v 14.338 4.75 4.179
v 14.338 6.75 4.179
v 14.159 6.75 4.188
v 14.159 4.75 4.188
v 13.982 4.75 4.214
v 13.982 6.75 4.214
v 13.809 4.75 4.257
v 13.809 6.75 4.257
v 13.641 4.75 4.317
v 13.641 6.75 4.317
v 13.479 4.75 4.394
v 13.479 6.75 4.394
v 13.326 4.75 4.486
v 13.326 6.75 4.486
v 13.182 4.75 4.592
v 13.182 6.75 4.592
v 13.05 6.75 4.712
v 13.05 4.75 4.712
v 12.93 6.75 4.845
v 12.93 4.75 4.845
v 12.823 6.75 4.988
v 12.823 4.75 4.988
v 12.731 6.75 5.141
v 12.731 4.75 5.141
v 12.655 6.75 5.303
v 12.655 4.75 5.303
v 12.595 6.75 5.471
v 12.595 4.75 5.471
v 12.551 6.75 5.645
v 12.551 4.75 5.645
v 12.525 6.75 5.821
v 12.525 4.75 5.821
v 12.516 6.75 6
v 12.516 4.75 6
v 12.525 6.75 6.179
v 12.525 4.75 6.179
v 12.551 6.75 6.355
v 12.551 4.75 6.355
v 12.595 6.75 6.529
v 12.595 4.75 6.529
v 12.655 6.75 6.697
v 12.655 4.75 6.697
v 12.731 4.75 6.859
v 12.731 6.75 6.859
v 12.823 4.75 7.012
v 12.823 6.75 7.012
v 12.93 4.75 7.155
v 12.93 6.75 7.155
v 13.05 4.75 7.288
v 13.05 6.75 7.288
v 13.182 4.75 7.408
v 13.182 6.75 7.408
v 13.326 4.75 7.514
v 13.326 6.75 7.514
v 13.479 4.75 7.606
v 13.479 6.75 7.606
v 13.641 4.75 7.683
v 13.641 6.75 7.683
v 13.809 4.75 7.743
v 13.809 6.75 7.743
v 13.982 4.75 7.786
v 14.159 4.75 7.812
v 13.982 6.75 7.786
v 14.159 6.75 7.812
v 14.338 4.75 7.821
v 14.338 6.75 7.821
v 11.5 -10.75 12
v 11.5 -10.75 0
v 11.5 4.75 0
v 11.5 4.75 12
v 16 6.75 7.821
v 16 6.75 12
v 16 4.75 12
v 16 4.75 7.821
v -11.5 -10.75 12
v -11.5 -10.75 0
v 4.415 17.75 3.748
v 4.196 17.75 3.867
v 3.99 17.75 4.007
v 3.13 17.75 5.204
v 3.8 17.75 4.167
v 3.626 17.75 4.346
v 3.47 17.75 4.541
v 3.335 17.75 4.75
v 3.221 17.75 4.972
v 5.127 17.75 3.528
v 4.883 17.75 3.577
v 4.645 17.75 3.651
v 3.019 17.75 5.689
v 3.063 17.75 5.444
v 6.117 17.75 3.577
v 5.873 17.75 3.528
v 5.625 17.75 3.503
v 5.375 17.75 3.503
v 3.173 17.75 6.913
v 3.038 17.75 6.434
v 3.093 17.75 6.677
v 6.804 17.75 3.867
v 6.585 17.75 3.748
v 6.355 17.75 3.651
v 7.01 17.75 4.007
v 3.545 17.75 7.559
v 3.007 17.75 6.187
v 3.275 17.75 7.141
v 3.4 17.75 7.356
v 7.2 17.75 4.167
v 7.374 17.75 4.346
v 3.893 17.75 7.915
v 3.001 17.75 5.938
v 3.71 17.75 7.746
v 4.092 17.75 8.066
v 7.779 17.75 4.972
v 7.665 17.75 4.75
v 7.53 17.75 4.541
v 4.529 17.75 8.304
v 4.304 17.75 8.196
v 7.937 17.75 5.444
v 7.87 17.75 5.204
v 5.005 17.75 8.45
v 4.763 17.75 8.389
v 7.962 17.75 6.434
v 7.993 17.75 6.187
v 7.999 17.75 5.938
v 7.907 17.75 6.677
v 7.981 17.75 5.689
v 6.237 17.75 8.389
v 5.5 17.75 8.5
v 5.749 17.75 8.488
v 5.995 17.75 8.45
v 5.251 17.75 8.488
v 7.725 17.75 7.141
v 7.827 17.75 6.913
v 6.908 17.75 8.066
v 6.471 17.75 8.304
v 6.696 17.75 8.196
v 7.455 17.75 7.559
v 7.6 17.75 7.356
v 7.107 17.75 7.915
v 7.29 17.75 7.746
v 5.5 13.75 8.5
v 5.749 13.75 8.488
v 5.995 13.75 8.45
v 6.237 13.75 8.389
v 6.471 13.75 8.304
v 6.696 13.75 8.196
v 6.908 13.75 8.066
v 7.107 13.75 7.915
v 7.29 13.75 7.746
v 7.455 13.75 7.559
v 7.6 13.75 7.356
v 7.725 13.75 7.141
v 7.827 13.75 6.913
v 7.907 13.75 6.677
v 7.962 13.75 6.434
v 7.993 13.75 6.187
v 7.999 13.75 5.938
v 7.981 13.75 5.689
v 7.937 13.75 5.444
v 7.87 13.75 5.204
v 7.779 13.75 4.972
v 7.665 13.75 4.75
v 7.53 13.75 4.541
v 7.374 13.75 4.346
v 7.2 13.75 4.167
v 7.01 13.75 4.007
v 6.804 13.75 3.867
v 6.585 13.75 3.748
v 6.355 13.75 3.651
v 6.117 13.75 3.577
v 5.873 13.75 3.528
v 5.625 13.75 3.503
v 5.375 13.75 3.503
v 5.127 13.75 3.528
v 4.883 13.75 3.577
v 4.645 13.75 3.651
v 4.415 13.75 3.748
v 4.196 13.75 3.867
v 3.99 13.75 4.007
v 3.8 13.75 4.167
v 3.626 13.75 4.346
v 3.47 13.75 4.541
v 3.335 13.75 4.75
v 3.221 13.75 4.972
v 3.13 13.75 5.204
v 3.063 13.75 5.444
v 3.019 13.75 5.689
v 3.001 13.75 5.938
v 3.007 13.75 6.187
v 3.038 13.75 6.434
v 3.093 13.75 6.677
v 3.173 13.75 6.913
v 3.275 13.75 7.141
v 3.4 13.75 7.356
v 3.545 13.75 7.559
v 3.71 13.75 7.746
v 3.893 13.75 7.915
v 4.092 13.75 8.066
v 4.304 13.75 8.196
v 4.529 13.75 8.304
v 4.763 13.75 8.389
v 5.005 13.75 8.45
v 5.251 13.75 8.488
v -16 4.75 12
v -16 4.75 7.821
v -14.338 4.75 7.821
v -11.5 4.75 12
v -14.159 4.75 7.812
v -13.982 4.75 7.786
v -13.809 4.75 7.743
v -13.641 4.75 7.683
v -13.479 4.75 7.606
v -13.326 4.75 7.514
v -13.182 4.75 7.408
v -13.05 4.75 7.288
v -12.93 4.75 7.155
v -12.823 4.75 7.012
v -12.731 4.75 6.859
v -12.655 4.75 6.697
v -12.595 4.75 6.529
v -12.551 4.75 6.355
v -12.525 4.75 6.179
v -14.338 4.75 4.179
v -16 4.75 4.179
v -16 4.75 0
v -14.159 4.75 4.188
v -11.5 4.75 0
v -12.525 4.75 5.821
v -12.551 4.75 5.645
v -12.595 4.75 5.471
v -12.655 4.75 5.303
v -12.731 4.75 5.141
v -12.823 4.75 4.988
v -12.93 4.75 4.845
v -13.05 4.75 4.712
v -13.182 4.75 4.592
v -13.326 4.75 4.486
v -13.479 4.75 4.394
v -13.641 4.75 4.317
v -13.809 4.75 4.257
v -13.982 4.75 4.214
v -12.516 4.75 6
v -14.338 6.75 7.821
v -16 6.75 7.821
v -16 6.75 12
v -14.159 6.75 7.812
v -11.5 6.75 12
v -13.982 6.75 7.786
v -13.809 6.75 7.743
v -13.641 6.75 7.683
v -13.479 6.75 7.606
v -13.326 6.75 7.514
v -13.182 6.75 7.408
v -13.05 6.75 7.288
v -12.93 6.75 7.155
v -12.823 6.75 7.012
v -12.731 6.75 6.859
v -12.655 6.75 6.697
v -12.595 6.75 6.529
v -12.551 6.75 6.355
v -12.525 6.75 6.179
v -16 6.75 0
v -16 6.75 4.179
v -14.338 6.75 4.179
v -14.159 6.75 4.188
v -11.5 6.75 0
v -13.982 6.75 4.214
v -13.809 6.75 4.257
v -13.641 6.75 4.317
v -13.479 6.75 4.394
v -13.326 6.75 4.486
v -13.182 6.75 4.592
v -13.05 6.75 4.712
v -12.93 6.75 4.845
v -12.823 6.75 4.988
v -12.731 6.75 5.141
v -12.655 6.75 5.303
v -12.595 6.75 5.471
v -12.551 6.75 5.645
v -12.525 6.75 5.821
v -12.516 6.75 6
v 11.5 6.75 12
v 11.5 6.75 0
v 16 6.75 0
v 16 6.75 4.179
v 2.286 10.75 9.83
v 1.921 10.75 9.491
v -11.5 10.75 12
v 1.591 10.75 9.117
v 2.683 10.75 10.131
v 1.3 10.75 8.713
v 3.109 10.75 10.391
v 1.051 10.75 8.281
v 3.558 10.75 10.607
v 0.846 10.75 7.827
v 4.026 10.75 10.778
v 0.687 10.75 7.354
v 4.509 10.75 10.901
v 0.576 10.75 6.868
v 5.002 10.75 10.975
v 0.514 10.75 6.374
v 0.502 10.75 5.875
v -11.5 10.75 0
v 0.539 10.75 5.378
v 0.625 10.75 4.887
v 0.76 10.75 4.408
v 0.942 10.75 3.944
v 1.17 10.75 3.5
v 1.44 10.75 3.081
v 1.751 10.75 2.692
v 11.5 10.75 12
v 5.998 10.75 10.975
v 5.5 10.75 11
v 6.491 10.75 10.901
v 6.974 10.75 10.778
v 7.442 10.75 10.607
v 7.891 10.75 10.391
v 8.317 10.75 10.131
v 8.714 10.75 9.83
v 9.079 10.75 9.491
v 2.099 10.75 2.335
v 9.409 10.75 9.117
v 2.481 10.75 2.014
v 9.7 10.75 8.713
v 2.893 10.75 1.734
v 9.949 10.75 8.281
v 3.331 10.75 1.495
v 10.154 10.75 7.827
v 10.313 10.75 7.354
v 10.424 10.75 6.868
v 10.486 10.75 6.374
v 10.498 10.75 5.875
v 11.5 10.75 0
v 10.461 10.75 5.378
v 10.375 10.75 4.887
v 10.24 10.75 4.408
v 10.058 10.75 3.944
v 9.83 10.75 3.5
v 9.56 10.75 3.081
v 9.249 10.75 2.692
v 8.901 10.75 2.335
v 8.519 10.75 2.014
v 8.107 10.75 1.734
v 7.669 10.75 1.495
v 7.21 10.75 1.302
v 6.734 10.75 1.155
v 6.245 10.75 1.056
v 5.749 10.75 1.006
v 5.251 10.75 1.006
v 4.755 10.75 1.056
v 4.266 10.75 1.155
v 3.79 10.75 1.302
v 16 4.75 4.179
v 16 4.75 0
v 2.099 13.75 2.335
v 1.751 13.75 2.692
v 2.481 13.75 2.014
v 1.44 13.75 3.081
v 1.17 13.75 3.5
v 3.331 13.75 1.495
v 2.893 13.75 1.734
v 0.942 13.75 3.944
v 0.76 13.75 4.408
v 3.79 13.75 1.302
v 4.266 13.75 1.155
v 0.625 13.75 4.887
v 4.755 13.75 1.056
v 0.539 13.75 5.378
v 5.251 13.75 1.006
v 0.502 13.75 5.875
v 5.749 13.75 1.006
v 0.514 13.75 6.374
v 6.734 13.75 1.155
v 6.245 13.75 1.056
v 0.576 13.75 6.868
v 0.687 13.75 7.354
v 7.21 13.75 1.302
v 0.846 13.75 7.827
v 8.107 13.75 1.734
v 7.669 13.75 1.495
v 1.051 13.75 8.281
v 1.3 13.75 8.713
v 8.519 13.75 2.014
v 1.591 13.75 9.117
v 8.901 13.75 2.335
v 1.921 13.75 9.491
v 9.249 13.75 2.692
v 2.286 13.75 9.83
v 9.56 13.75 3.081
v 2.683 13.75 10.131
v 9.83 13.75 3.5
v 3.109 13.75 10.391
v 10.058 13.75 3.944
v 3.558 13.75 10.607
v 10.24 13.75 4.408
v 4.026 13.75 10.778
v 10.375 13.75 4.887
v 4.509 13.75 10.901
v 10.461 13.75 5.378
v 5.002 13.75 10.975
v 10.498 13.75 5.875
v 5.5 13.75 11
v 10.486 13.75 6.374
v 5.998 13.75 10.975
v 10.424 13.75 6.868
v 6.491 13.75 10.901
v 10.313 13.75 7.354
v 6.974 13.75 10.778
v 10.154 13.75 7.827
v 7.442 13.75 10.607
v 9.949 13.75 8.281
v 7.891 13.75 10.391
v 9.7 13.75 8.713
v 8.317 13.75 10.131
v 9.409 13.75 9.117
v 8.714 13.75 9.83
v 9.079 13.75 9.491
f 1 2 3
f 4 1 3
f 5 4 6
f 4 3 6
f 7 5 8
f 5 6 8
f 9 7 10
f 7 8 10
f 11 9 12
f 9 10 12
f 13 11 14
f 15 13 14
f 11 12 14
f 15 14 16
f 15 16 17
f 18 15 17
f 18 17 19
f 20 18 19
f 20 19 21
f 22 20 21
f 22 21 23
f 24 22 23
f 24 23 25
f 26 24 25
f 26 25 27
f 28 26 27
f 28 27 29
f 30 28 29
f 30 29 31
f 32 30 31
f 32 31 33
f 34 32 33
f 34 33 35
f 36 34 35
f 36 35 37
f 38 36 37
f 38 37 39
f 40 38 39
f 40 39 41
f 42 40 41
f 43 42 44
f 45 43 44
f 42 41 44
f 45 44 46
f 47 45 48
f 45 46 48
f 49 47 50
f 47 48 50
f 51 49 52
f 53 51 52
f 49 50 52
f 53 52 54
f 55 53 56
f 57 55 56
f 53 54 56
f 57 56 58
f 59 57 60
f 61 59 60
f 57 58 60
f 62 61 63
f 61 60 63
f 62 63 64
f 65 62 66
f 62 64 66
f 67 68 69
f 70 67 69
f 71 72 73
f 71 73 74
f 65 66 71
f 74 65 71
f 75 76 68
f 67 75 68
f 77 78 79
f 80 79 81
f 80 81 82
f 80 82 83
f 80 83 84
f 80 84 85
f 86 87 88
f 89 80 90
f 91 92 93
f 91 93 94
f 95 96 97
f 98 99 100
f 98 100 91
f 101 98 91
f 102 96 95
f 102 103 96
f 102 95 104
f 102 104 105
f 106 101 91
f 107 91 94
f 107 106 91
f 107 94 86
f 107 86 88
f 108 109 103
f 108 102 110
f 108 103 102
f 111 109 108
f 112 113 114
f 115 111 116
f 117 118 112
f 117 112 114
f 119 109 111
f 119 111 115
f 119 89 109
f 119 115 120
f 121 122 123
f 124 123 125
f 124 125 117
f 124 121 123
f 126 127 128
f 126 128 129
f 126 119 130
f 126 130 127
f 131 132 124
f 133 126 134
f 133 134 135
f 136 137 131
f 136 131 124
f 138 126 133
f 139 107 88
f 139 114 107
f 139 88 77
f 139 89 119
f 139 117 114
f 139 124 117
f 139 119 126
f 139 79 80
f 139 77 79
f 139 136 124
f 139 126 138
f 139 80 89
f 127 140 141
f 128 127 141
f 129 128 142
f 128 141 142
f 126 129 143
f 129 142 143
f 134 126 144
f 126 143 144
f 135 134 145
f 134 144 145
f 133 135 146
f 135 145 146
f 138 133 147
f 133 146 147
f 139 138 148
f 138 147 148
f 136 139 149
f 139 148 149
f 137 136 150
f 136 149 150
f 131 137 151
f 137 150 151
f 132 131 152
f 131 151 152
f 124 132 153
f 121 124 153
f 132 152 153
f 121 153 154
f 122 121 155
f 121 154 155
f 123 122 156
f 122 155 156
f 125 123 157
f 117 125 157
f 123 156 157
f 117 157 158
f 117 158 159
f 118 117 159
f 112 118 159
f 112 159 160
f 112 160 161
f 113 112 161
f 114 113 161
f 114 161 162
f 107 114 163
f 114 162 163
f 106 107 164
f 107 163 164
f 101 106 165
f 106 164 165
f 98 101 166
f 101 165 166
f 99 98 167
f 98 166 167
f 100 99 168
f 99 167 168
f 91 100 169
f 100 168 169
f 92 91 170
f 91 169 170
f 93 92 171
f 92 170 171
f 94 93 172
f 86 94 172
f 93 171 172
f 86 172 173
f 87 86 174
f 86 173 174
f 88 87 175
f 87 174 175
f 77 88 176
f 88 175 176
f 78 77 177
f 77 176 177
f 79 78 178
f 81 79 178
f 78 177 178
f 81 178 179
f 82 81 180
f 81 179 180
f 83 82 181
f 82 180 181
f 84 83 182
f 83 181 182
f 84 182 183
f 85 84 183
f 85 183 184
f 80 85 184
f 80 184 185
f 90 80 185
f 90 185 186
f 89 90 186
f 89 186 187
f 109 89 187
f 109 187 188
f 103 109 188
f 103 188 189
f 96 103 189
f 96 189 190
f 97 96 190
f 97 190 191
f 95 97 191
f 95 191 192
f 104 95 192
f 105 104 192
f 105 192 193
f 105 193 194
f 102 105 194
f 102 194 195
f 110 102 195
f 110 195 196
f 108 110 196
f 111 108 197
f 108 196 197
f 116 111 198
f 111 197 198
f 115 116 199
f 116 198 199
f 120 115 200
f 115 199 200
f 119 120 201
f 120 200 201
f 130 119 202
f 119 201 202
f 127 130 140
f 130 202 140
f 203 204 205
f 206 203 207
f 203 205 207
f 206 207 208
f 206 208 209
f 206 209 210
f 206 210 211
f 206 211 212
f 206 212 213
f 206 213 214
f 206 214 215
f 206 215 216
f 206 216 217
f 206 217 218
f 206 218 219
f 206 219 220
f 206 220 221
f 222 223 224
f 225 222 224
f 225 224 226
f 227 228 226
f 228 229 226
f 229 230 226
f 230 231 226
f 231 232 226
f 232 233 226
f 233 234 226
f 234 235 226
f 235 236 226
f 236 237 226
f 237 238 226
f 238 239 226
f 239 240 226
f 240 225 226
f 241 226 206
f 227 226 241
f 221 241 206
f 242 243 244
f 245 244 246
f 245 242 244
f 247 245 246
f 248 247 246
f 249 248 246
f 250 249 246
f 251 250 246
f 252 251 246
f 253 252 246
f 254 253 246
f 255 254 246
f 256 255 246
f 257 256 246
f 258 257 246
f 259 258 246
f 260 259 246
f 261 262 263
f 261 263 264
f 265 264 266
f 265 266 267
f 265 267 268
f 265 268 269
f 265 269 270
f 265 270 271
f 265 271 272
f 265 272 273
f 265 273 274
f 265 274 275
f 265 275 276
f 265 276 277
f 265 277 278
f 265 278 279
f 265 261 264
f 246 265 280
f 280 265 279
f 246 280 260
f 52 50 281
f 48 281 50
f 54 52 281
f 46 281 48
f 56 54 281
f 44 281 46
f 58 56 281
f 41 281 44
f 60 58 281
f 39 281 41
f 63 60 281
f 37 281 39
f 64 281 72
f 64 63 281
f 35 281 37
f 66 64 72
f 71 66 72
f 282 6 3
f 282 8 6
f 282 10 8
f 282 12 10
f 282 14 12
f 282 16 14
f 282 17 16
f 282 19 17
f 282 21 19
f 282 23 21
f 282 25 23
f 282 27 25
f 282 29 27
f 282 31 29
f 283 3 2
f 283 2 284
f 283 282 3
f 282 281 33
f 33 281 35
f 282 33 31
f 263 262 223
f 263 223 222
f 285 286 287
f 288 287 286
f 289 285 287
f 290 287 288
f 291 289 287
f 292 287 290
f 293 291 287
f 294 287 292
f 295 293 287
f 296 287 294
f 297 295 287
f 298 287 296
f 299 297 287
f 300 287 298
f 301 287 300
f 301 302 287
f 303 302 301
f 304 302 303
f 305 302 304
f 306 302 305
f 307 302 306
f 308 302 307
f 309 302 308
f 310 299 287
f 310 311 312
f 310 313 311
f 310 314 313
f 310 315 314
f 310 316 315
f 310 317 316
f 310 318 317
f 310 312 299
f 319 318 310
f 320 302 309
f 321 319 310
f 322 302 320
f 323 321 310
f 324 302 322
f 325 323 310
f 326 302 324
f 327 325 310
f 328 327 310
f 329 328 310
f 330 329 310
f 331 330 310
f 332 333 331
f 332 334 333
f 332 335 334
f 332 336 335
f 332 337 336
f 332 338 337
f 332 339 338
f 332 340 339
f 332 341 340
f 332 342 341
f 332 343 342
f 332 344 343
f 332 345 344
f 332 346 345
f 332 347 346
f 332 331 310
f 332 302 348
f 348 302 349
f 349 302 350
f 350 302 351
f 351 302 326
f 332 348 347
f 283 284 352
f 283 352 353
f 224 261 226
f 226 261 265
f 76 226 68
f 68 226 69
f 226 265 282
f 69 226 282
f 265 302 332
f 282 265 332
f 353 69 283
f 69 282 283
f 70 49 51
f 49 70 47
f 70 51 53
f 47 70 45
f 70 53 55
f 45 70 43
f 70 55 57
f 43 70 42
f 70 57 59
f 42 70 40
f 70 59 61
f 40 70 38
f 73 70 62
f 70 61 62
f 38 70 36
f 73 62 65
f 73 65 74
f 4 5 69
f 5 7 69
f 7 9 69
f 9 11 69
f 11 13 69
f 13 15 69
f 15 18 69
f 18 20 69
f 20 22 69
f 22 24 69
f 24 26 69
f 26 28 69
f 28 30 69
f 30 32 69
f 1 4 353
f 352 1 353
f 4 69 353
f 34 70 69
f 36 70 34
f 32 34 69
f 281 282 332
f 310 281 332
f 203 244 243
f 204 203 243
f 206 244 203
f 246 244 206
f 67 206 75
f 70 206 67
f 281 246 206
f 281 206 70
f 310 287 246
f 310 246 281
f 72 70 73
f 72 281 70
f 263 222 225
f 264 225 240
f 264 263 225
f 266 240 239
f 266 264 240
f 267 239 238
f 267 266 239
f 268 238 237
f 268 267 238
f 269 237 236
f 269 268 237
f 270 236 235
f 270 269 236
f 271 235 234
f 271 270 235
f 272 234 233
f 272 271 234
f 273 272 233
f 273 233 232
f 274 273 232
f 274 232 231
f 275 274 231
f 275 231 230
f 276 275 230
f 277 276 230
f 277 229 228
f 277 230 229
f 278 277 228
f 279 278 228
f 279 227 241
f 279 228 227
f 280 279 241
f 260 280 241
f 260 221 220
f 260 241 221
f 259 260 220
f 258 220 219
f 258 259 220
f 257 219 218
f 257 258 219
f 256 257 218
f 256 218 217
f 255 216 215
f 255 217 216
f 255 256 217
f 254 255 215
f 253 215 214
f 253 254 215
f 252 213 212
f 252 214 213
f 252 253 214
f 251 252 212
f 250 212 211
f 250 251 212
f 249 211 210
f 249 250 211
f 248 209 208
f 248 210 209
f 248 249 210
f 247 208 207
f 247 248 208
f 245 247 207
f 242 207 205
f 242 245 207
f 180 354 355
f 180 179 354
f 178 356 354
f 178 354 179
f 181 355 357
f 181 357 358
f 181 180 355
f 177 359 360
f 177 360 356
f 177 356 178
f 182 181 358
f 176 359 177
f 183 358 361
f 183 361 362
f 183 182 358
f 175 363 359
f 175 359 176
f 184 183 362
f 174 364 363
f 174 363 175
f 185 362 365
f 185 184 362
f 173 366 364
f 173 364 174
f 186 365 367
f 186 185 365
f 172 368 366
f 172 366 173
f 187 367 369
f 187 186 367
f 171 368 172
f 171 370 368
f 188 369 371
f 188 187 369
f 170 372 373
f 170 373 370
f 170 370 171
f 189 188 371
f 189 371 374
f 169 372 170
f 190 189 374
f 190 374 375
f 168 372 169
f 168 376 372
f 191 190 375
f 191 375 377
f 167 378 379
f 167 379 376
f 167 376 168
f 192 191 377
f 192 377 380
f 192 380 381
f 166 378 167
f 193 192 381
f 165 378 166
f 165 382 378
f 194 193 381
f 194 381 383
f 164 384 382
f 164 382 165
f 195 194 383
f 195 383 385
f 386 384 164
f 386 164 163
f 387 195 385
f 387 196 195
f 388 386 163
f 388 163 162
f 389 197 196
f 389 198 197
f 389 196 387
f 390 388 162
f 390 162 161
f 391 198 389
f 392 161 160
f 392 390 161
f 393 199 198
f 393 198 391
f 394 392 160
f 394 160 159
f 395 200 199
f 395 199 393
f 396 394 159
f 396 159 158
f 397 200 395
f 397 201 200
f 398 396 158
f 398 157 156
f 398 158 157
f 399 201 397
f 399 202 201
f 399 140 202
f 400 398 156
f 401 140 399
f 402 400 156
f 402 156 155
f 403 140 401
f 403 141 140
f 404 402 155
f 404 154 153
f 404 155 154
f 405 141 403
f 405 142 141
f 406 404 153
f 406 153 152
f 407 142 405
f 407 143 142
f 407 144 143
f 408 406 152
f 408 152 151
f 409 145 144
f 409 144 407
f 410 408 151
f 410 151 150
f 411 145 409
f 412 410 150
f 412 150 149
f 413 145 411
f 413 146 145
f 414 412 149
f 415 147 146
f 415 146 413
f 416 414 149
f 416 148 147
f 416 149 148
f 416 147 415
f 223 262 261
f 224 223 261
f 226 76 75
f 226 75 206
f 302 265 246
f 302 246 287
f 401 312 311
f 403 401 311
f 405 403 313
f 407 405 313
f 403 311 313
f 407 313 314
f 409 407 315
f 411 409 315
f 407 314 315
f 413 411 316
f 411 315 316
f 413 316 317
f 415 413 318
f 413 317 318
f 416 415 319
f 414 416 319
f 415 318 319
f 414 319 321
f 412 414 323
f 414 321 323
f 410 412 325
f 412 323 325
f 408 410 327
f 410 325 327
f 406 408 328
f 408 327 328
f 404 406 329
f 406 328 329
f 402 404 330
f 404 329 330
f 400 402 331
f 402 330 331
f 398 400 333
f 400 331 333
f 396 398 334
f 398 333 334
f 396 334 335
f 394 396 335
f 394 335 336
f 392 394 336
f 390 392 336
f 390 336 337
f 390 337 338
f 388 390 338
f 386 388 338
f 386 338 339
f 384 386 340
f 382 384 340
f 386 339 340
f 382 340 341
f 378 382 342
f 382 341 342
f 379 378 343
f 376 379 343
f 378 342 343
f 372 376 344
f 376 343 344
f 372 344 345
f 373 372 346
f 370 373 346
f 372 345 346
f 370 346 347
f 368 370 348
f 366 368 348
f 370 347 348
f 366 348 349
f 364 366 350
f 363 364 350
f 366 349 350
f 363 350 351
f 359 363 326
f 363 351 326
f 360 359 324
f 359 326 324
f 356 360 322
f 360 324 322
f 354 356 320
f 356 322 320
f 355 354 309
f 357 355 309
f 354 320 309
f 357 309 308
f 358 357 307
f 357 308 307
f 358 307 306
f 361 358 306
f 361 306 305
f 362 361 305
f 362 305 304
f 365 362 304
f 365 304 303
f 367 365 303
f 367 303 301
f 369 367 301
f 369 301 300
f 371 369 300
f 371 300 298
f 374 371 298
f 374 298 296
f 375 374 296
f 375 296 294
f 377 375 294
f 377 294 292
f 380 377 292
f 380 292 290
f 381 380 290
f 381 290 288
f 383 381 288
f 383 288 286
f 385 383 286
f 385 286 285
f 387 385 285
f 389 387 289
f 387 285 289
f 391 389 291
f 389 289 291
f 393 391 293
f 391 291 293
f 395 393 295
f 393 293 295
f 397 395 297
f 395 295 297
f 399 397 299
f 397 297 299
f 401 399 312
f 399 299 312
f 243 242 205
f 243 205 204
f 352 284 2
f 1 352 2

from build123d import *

# Parameters (mm, degrees)
SKETCH1_W           = 23
SKETCH1_H           = 21.5
BOSS_EXTRUDE1_DEPTH = 12
SKETCH4_W           = 32
SKETCH4_H           = 12
BOSS_EXTRUDE2_DEPTH = 2
SKETCH5_R           = 5
BOSS_EXTRUDE3_DEPTH = 3
SKETCH6_R           = 2.5
BOSS_EXTRUDE4_DEPTH = 4
CUT_EXTRUDE1_DEPTH  = 4


with BuildPart() as part:
    # Sketch1 → Boss-Extrude1 (new body)
    with BuildSketch(Plane.XY):
        Rectangle(SKETCH1_W, SKETCH1_H)
    extrude(amount=BOSS_EXTRUDE1_DEPTH)

    # Sketch4 → Boss-Extrude2 (add)
    with BuildSketch(Plane(origin=(0, 6.75, 0), x_dir=(1, 0, 0), z_dir=(0, 1, 0))):
        with Locations((0, -6)):
            Rectangle(SKETCH4_W, SKETCH4_H)
    extrude(amount=-BOSS_EXTRUDE2_DEPTH)

    # Sketch5 → Boss-Extrude3 (add)
    with BuildSketch(Plane(origin=(0, 10.75, 0), x_dir=(1, 0, 0), z_dir=(0, 1, 0))):
        with Locations(Location((5.5, -6, 0), (0, 0, 270))):
            Circle(SKETCH5_R)
    extrude(amount=BOSS_EXTRUDE3_DEPTH)

    # Sketch6 → Boss-Extrude4 (add)
    with BuildSketch(Plane(origin=(0, 13.75, 0), x_dir=(1, 0, 0), z_dir=(0, 1, 0))):
        with Locations(Location((5.5, -6, 0), (0, 0, 270))):
            Circle(SKETCH6_R)
    extrude(amount=BOSS_EXTRUDE4_DEPTH)

    # Sketch7 → Cut-Extrude1 (cut)
    with BuildSketch(Plane(origin=(0, 6.75, 0), x_dir=(1, 0, 0), z_dir=(0, 1, 0))):
        with BuildLine():
            Line((-16, -4.178738648), (-14.337589365, -4.178738648))
            ThreePointArc((-14.337589365, -4.178738648), (-12.516328014, -6), (-14.337589365, -7.821261352))
            Line((-14.337589365, -7.821261352), (-16, -7.821261352))
            ThreePointArc((-16, -7.821261352), (-17.821261352, -6), (-16, -4.178738648))
        make_face()
        with BuildLine():
            Line((16, -4.178738648), (14.337589365, -4.178738648))
            ThreePointArc((14.337589365, -4.178738648), (12.516328014, -6), (14.337589365, -7.821261352))
            Line((14.337589365, -7.821261352), (16, -7.821261352))
            ThreePointArc((16, -7.821261352), (17.821261352, -6), (16, -4.178738648))
        make_face()
    extrude(amount=-CUT_EXTRUDE1_DEPTH, mode=Mode.SUBTRACT)


solid = part.part
